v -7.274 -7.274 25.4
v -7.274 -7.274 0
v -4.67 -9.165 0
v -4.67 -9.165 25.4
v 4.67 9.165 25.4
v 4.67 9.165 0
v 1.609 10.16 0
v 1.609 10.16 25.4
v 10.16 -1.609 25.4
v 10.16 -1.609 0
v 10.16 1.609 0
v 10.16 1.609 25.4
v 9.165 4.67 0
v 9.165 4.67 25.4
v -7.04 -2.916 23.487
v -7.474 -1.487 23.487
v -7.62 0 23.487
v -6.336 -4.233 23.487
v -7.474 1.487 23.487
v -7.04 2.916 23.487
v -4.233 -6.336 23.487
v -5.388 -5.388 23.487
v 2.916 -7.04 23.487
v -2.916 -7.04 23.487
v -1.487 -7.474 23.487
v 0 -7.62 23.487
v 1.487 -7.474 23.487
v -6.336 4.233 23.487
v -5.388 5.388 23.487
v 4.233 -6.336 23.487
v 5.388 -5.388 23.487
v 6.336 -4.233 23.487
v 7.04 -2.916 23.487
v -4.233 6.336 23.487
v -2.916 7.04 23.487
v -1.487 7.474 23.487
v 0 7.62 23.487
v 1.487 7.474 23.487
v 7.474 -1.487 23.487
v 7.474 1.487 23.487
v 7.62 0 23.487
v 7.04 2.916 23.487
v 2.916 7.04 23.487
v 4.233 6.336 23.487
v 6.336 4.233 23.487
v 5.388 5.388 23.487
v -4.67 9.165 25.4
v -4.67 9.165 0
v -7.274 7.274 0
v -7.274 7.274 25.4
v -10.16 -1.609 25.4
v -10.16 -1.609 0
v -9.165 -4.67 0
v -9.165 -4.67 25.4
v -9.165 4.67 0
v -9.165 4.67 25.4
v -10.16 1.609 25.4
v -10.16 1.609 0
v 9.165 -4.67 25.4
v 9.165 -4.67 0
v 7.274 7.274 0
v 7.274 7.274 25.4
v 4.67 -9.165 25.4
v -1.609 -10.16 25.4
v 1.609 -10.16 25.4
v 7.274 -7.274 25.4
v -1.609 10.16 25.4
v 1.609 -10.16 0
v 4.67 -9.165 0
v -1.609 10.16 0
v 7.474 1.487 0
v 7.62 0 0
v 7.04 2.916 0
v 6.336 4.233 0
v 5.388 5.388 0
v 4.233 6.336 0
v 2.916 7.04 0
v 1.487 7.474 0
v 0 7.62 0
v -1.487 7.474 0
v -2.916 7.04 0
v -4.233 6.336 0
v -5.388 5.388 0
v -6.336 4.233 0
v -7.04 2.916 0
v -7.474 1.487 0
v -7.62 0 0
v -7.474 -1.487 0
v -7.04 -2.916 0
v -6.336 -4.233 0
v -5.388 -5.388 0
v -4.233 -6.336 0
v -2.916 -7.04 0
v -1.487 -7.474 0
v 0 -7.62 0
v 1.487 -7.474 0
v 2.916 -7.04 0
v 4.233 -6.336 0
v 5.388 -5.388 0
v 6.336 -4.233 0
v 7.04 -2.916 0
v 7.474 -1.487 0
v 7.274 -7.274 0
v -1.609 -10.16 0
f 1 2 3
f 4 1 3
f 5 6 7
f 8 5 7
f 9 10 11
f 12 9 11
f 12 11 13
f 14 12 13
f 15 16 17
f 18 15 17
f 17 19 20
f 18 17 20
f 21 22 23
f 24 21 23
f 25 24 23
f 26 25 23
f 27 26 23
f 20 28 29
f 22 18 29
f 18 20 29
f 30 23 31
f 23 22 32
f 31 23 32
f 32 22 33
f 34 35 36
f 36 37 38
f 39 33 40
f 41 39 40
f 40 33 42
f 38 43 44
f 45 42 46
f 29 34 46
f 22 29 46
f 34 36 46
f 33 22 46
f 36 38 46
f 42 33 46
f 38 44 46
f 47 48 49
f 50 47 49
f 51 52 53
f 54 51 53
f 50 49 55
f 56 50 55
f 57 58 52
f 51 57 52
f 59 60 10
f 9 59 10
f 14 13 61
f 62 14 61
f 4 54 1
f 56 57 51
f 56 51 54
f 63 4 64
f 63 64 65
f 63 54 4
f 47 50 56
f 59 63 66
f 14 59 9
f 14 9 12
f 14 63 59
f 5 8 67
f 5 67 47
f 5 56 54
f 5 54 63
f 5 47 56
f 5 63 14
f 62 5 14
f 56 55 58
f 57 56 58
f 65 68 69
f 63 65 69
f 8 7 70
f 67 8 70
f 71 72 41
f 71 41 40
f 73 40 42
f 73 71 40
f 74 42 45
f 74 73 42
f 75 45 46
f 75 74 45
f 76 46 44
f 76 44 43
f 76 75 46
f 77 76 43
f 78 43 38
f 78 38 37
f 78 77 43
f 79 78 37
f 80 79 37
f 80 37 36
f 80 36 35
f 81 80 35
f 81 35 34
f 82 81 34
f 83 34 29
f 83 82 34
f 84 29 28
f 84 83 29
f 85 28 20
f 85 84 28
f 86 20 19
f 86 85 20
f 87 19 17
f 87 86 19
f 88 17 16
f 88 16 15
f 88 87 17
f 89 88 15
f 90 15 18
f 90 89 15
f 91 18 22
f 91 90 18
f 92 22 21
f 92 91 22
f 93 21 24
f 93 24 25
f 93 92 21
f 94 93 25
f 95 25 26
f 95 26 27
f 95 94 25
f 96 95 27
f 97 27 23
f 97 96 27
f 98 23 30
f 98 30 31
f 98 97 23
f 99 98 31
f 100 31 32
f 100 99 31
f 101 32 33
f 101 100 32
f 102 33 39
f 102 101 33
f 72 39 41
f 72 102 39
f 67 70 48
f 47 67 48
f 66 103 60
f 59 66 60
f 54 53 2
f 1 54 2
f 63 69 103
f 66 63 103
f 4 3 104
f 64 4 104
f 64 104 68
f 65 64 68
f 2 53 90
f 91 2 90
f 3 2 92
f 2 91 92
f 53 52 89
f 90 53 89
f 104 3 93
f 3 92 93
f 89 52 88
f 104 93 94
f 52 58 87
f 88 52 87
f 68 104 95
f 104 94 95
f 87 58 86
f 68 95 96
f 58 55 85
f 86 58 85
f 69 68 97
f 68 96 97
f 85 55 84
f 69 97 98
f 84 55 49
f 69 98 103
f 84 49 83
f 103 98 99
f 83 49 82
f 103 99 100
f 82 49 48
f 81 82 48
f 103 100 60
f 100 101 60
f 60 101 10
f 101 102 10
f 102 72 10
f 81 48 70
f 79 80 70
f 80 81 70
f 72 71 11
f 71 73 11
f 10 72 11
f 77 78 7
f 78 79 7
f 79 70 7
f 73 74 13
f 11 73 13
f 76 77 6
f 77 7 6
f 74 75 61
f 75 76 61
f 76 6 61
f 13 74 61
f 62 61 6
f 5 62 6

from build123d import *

# Parameters (mm, degrees)
F0_R     = 7.62
F1_DEPTH = 25.4
F2_DEPTH = 23.486745


with BuildPart() as f1:
    # F0 (on Top) → F1 (new body)
    with BuildSketch(Plane.XY):
        Polygon((1.609186, 10.16), (-1.609186, 10.16), (-4.670039, 9.165468), (-7.273757, 7.273757), (-9.165468, 4.670039), (-10.16, 1.609186), (-10.16, -1.609186), (-9.165468, -4.670039), (-7.273757, -7.273757), (-4.670039, -9.165468), (-1.609186, -10.16), (1.609186, -10.16), (4.670039, -9.165468), (7.273757, -7.273757), (9.165468, -4.670039), (10.16, -1.609186), (10.16, 1.609186), (9.165468, 4.670039), (7.273757, 7.273757), (4.670039, 9.165468), align=None)
        Circle(F0_R, mode=Mode.SUBTRACT)
        Circle(F0_R)
    extrude(amount=F1_DEPTH)

    # F0 (on Top) → F2 (cut)
    with BuildSketch(Plane.XY):
        Circle(F0_R)
    extrude(amount=F2_DEPTH, mode=Mode.SUBTRACT)


solid = f1.part
